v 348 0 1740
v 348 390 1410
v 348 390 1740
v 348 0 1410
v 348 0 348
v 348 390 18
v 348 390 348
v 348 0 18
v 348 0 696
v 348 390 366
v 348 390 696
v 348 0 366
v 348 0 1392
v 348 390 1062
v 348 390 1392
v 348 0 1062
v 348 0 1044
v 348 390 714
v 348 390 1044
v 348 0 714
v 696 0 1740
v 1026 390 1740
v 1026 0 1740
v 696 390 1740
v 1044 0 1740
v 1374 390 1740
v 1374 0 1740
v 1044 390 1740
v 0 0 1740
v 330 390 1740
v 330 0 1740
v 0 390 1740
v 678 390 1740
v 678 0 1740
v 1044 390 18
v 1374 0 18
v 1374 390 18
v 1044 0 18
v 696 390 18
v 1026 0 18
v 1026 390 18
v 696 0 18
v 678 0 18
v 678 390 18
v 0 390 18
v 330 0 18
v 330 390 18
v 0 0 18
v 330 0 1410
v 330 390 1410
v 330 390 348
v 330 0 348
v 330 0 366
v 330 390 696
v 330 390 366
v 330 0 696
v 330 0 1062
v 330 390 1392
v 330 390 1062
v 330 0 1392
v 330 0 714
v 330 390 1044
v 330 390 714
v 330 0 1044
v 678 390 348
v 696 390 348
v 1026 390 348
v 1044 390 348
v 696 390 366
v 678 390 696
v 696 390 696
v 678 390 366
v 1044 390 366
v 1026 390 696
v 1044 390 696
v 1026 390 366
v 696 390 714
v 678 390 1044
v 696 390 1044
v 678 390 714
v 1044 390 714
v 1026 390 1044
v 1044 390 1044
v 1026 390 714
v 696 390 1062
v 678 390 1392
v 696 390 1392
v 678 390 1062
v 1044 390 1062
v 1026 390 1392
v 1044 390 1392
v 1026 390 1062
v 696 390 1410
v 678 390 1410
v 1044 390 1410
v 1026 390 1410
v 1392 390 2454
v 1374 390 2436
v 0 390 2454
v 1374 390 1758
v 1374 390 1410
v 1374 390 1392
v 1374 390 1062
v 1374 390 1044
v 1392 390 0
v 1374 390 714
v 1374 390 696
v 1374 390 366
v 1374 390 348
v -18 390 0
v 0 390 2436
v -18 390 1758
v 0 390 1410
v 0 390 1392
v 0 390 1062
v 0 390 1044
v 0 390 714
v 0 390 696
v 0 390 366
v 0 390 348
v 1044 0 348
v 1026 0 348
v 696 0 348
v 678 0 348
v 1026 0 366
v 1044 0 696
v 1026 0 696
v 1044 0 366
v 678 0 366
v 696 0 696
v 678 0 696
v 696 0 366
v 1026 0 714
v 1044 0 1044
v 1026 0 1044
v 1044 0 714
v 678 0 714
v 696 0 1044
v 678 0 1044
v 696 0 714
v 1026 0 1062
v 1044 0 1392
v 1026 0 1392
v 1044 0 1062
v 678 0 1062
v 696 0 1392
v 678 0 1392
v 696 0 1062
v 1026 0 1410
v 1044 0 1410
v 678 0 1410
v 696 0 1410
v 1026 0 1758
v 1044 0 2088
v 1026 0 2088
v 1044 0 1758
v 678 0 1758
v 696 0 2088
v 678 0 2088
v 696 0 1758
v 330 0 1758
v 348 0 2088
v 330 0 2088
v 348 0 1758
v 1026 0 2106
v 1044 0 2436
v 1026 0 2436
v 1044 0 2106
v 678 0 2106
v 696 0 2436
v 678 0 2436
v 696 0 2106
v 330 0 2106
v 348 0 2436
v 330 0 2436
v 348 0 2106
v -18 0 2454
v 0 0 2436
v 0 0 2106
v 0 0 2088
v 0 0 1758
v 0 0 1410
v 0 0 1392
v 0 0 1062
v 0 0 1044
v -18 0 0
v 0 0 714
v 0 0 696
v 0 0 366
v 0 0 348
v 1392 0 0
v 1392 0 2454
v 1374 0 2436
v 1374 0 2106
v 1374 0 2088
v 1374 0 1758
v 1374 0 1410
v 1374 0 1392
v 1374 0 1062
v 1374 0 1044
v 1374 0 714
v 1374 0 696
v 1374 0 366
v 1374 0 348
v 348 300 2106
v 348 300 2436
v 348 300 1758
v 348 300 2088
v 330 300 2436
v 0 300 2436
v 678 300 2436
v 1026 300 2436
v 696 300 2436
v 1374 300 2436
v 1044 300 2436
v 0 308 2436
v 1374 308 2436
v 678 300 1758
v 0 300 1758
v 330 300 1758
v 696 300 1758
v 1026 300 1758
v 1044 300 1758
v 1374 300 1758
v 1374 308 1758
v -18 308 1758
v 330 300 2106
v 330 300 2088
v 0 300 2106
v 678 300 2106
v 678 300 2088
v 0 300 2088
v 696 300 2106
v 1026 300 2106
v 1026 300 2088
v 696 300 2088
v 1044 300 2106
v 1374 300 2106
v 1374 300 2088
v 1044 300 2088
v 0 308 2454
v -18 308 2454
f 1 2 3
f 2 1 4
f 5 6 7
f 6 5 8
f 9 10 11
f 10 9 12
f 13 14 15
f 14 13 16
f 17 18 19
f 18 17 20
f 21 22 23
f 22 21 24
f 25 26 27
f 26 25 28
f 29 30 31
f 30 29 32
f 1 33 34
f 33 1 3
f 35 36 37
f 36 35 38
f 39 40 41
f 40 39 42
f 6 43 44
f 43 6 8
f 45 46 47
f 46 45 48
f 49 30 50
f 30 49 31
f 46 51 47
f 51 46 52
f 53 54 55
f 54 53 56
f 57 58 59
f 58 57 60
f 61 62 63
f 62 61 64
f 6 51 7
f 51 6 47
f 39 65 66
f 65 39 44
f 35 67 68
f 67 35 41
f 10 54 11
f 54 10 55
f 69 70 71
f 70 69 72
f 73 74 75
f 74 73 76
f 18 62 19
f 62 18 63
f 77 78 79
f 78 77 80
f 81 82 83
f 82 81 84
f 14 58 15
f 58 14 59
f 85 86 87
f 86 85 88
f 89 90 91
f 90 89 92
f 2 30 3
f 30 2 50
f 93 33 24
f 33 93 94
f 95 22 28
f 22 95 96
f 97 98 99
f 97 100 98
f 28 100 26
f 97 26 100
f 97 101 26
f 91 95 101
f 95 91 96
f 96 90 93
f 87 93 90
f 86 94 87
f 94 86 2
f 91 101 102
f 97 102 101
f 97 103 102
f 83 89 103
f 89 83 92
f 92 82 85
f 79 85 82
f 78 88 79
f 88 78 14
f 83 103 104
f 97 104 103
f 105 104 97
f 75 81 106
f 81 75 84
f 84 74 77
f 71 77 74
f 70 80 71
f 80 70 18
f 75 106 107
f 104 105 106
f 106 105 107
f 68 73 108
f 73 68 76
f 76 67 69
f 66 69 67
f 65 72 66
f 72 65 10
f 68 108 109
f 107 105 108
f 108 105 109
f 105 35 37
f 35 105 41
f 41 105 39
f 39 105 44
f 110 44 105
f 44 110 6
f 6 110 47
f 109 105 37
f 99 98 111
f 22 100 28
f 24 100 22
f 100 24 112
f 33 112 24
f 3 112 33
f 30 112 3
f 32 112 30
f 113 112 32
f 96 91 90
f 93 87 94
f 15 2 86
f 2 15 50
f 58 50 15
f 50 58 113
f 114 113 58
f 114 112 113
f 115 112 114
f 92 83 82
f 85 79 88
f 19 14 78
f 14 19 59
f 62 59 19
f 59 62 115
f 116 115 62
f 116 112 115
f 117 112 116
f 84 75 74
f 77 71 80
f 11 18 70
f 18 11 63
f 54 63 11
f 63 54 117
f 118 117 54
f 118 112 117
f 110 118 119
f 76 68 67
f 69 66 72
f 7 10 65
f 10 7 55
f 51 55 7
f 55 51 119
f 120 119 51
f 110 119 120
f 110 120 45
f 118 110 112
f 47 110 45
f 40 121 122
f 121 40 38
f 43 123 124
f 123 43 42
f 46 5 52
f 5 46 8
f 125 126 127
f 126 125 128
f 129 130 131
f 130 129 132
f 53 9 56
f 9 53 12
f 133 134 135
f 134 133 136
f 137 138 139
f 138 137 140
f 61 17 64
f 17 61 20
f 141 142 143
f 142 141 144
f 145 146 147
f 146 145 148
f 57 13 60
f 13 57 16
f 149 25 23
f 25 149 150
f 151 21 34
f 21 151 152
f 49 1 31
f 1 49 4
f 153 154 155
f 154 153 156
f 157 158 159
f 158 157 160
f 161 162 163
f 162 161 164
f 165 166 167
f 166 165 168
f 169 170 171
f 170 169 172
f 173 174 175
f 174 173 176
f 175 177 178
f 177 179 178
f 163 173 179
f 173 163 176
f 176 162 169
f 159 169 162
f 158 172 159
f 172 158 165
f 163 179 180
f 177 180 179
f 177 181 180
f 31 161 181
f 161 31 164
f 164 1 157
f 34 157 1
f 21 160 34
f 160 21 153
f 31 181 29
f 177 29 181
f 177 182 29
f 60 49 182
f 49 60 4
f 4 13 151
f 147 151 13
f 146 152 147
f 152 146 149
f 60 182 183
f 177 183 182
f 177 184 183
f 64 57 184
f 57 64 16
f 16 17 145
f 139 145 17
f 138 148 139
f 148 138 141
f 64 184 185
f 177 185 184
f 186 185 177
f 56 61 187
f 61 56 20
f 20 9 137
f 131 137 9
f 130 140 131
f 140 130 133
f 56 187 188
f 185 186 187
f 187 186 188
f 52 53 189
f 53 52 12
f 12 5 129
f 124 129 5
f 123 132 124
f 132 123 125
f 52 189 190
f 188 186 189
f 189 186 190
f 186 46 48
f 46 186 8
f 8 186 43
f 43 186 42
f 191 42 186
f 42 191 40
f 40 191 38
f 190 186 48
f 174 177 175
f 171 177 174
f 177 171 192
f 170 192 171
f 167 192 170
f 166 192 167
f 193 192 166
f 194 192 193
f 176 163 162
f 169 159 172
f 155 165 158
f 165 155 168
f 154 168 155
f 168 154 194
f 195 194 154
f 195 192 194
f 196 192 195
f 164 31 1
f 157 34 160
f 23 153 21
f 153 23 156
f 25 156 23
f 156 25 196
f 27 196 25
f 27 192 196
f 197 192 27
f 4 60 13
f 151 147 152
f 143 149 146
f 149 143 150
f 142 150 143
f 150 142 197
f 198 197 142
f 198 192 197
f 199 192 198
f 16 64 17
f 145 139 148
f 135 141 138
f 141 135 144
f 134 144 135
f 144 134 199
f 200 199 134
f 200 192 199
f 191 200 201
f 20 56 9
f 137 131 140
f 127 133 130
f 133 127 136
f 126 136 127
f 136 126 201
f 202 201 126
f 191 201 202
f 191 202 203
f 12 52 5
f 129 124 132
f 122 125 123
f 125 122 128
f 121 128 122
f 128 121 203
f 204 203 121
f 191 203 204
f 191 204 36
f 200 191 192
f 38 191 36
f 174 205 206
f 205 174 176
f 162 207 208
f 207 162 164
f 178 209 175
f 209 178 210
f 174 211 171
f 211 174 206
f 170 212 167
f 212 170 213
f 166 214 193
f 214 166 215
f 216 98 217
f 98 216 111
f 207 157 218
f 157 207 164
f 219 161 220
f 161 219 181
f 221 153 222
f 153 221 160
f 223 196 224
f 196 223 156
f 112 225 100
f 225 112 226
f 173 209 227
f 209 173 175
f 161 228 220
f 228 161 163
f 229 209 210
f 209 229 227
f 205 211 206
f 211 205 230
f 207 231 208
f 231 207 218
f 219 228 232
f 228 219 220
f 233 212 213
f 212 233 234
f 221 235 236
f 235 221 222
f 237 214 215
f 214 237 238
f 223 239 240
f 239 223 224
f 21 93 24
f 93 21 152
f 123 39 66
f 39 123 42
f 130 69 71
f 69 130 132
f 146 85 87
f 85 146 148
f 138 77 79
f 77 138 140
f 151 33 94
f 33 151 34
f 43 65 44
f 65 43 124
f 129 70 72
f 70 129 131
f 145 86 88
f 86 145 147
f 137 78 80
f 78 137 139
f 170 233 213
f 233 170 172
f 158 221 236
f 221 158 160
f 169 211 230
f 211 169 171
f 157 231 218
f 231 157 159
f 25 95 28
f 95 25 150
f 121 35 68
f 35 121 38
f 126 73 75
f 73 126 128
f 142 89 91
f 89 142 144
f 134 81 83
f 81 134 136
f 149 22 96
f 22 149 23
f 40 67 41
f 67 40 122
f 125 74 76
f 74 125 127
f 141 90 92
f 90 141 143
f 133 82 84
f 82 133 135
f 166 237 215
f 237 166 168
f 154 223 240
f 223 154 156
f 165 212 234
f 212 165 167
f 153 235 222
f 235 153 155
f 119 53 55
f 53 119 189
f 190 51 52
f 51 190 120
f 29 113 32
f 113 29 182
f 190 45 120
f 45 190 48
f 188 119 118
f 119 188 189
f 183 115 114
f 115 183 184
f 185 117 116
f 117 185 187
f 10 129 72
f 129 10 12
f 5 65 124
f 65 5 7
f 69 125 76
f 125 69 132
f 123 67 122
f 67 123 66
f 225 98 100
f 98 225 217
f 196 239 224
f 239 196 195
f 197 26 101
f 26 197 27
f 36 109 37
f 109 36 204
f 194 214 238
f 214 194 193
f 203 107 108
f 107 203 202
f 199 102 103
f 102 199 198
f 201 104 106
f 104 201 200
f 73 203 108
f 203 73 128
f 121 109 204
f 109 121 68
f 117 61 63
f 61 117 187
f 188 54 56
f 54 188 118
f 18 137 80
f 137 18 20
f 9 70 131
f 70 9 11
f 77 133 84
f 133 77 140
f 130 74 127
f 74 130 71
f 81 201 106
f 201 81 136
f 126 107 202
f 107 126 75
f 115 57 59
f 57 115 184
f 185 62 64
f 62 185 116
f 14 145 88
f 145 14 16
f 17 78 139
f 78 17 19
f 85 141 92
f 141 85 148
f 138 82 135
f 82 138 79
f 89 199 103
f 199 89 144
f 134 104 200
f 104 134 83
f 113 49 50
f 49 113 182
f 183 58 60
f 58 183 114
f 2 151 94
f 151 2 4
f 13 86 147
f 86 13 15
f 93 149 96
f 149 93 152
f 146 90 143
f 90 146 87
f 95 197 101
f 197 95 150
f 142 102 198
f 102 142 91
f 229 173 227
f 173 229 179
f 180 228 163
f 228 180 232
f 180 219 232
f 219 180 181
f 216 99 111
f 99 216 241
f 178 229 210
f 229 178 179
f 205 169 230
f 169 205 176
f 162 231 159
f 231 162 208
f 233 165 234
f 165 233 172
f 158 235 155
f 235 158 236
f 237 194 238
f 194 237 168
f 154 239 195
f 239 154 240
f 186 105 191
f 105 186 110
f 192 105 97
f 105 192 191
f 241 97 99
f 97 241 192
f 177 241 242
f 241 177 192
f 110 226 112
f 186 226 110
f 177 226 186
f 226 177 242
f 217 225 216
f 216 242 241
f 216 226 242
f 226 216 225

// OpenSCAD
// bottom
cube([1374, 390, 18], false);

// right
translate([1374, 0, 0])
	cube([18, 390, 2454], false);

// top
translate([0, 0, 2436])
	cube([1374, 390, 18], false);

// left bottom
translate([-18, 0, 0])
	cube([18, 390, 1740], false);
	
// left top
translate([-18, 0, 1758])
	cube([18, 300, 696], false);

// vertical sides
for ( col = [0 : 2] ) {
	// bottom
	translate([330+col*330+col*18, 0, 18])
		cube([18, 390, 1722], false);
	// top
	translate([330+col*330+col*18, 0, 1758])
		cube([18, 300, 678], false);
}

//horizontal break
translate([-18, 0, 1740])
	cube([1392, 390, 18], false);

// back
translate([-18, 300, 1758])
	cube([1392, 8, 696], false);

// horizontal sides
for ( col = [0 : 3] ) {
	for ( row = [0 : 3] ) {
		translate([row*330+row*18, 0, 330+col*330+18+col*18])
			cube([330, 390, 18], false);
	}
}

// horizontal sides top
for ( row = [0 : 3] ) {
	translate([row*330+row*18, 0, 1740+330+18])
		cube([330, 300, 18], false);
}
